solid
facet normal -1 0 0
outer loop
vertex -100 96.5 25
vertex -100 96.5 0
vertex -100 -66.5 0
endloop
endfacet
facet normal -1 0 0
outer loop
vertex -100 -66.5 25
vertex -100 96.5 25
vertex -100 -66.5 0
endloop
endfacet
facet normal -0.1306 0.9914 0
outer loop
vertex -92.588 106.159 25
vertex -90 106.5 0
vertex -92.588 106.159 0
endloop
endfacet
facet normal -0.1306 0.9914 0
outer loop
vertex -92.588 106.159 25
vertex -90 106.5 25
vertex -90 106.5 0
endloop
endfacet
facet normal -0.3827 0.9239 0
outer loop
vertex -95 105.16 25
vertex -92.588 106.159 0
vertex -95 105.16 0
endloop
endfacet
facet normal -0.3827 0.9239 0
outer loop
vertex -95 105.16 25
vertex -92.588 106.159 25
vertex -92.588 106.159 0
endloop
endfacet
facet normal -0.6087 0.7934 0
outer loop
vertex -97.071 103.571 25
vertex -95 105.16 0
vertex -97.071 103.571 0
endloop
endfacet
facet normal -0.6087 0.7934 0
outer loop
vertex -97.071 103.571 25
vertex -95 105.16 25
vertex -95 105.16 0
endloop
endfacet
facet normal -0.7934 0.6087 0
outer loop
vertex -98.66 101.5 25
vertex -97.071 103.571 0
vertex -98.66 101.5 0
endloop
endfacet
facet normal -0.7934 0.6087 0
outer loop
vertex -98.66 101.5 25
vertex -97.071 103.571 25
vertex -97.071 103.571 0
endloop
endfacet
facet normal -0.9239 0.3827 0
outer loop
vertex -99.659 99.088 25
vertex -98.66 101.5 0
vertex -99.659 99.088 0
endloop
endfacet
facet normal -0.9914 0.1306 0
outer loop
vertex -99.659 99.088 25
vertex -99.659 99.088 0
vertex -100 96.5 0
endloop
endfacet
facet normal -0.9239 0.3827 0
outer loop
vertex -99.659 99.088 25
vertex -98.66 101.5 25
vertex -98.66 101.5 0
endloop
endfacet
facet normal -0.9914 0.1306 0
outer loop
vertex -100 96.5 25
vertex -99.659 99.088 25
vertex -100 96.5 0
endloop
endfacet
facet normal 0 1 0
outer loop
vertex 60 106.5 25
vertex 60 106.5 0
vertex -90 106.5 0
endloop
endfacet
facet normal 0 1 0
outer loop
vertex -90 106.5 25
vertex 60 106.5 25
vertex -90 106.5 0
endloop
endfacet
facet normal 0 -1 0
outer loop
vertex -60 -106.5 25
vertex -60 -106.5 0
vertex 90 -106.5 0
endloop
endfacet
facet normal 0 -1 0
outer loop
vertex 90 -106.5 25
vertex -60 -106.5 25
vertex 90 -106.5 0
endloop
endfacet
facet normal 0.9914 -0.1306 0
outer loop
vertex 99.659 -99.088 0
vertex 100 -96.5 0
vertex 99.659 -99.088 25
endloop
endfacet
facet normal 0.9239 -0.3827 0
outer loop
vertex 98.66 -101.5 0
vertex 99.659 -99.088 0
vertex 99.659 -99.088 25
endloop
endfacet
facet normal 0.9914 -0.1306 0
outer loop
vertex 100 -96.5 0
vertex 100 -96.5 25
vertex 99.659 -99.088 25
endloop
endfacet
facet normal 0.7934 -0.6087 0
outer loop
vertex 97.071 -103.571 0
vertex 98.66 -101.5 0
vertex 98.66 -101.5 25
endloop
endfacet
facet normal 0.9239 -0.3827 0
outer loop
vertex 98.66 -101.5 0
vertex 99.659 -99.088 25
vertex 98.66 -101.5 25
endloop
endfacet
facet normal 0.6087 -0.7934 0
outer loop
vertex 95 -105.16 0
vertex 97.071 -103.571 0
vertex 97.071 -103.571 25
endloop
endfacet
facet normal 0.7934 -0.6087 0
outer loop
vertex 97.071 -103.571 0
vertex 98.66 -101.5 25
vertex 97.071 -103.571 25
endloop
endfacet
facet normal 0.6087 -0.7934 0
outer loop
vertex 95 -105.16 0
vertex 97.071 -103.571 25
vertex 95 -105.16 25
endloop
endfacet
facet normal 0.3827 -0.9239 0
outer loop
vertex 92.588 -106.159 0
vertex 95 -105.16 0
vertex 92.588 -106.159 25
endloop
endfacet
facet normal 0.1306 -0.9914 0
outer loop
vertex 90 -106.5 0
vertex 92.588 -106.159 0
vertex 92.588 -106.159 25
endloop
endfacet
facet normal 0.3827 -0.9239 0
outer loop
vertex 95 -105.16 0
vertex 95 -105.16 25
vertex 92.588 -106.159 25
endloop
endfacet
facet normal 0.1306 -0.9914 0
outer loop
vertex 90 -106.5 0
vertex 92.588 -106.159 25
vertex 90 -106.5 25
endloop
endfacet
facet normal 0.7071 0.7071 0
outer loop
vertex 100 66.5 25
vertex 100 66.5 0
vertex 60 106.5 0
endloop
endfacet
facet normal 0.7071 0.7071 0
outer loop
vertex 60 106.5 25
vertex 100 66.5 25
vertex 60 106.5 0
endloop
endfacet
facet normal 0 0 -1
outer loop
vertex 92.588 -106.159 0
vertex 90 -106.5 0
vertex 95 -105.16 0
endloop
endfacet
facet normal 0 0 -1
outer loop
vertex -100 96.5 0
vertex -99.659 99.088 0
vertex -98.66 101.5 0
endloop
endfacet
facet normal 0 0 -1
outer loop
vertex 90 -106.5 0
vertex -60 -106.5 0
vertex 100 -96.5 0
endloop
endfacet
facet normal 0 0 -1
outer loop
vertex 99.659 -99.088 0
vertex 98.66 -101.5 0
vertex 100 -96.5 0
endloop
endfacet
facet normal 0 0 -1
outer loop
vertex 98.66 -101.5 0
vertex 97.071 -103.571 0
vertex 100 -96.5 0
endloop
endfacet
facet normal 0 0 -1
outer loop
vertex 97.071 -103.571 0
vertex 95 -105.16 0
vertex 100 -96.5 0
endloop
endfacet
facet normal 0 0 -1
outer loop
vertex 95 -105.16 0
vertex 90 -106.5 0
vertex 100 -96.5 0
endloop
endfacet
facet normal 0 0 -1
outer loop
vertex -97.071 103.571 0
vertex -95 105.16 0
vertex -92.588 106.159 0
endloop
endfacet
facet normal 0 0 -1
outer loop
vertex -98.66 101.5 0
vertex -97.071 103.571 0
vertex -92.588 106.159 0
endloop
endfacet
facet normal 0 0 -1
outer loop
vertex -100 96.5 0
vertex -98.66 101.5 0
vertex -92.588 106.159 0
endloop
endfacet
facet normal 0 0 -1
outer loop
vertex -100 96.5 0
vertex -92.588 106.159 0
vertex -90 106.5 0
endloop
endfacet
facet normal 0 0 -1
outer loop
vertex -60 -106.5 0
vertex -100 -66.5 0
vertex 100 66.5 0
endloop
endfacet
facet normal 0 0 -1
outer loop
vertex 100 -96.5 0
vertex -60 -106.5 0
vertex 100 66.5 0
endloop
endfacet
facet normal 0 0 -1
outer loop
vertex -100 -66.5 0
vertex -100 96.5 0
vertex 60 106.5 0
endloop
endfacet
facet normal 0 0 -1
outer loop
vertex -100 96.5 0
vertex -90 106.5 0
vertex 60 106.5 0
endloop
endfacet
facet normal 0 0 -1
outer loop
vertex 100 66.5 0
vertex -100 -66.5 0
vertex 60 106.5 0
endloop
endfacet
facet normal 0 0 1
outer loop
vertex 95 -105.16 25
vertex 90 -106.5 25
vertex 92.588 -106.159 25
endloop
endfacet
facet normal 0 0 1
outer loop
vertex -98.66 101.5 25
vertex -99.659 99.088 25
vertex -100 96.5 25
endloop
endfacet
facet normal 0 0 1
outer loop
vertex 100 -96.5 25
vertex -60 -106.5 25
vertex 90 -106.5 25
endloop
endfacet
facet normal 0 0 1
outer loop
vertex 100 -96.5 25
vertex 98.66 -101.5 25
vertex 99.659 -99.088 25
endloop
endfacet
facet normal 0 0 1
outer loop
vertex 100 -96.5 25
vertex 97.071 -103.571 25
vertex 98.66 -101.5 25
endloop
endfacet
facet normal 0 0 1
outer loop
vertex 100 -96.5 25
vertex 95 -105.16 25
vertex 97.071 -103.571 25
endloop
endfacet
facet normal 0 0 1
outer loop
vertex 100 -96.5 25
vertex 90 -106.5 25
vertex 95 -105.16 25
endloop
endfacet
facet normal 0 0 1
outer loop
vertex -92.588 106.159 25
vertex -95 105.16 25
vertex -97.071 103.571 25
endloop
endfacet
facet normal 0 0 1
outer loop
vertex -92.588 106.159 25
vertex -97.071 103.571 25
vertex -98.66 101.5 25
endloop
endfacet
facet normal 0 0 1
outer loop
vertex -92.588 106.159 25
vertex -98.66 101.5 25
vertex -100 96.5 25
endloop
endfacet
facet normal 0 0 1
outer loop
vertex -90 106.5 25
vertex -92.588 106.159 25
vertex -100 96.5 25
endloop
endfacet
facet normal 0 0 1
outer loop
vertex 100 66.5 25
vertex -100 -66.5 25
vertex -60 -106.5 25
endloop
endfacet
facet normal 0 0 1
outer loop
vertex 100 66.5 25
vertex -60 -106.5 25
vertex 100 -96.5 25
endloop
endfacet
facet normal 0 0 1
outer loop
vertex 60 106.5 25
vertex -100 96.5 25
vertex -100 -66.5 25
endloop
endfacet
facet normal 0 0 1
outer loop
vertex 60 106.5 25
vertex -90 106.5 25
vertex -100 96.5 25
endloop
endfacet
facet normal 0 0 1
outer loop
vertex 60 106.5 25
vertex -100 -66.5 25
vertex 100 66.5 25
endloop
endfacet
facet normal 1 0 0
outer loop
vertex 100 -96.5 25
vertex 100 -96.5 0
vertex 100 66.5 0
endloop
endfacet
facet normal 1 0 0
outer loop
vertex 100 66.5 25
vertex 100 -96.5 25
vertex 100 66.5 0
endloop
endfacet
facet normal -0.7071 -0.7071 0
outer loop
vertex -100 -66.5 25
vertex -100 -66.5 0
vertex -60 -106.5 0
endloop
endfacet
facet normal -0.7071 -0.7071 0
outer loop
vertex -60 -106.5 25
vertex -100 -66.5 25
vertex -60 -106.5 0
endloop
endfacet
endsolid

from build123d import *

# Parameters (mm, degrees)
F0_W     = 69
F0_H     = 69
F1_DEPTH = 25
F2_R     = 10
F3_R     = 10


with BuildPart() as f1:
    # F0 (on Top) → F1 (new body)
    with BuildSketch(Plane.XY):
        with BuildLine():
            Line((100, 66.5), (60, 106.5))
            Line((60, 106.5), (-100, 106.5))
            Line((-100, 106.5), (-100, -40.097934))
            ThreePointArc((-100, -40.097934), (-72.843769, -42.046339), (-46, -37.5))
            ThreePointArc((-46, -37.5), (2.288213, -8.788213), (31, 39.5))
            Line((31, 39.5), (100, 39.5))
            Line((100, 39.5), (100, 63.5))
            Line((100, 63.5), (100, 66.5))
        make_face()
        with BuildLine():
            ThreePointArc((31, 39.5), (2.288213, -8.788213), (-46, -37.5))
            Line((-46, -37.5), (-46, -106.5))
            Line((-46, -106.5), (31, -106.5))
            Line((31, -106.5), (31, -37.5))
            Line((31, -37.5), (100, -37.5))
            Line((100, -37.5), (100, 39.5))
            Line((100, 39.5), (31, 39.5))
        make_face()
        with BuildLine():
            ThreePointArc((-46, -37.5), (-72.843769, -42.046339), (-100, -40.097934))
            Line((-100, -40.097934), (-100, -66.5))
            Line((-100, -66.5), (-60, -106.5))
            Line((-60, -106.5), (-46, -106.5))
            Line((-46, -106.5), (-46, -37.5))
        make_face()
        with Locations((65.5, -72)):
            Rectangle(F0_W, F0_H)
    extrude(amount=F1_DEPTH)

    # F2
    f2_edges = [f1.edges().sort_by_distance(p)[0] for p in [
        (-100, 106.5, 12.5),
    ]]
    fillet(f2_edges, radius=F2_R)

    # F3
    f3_edges = [f1.edges().sort_by_distance(p)[0] for p in [
        (100, -106.5, 12.5),
    ]]
    fillet(f3_edges, radius=F3_R)


solid = f1.part
